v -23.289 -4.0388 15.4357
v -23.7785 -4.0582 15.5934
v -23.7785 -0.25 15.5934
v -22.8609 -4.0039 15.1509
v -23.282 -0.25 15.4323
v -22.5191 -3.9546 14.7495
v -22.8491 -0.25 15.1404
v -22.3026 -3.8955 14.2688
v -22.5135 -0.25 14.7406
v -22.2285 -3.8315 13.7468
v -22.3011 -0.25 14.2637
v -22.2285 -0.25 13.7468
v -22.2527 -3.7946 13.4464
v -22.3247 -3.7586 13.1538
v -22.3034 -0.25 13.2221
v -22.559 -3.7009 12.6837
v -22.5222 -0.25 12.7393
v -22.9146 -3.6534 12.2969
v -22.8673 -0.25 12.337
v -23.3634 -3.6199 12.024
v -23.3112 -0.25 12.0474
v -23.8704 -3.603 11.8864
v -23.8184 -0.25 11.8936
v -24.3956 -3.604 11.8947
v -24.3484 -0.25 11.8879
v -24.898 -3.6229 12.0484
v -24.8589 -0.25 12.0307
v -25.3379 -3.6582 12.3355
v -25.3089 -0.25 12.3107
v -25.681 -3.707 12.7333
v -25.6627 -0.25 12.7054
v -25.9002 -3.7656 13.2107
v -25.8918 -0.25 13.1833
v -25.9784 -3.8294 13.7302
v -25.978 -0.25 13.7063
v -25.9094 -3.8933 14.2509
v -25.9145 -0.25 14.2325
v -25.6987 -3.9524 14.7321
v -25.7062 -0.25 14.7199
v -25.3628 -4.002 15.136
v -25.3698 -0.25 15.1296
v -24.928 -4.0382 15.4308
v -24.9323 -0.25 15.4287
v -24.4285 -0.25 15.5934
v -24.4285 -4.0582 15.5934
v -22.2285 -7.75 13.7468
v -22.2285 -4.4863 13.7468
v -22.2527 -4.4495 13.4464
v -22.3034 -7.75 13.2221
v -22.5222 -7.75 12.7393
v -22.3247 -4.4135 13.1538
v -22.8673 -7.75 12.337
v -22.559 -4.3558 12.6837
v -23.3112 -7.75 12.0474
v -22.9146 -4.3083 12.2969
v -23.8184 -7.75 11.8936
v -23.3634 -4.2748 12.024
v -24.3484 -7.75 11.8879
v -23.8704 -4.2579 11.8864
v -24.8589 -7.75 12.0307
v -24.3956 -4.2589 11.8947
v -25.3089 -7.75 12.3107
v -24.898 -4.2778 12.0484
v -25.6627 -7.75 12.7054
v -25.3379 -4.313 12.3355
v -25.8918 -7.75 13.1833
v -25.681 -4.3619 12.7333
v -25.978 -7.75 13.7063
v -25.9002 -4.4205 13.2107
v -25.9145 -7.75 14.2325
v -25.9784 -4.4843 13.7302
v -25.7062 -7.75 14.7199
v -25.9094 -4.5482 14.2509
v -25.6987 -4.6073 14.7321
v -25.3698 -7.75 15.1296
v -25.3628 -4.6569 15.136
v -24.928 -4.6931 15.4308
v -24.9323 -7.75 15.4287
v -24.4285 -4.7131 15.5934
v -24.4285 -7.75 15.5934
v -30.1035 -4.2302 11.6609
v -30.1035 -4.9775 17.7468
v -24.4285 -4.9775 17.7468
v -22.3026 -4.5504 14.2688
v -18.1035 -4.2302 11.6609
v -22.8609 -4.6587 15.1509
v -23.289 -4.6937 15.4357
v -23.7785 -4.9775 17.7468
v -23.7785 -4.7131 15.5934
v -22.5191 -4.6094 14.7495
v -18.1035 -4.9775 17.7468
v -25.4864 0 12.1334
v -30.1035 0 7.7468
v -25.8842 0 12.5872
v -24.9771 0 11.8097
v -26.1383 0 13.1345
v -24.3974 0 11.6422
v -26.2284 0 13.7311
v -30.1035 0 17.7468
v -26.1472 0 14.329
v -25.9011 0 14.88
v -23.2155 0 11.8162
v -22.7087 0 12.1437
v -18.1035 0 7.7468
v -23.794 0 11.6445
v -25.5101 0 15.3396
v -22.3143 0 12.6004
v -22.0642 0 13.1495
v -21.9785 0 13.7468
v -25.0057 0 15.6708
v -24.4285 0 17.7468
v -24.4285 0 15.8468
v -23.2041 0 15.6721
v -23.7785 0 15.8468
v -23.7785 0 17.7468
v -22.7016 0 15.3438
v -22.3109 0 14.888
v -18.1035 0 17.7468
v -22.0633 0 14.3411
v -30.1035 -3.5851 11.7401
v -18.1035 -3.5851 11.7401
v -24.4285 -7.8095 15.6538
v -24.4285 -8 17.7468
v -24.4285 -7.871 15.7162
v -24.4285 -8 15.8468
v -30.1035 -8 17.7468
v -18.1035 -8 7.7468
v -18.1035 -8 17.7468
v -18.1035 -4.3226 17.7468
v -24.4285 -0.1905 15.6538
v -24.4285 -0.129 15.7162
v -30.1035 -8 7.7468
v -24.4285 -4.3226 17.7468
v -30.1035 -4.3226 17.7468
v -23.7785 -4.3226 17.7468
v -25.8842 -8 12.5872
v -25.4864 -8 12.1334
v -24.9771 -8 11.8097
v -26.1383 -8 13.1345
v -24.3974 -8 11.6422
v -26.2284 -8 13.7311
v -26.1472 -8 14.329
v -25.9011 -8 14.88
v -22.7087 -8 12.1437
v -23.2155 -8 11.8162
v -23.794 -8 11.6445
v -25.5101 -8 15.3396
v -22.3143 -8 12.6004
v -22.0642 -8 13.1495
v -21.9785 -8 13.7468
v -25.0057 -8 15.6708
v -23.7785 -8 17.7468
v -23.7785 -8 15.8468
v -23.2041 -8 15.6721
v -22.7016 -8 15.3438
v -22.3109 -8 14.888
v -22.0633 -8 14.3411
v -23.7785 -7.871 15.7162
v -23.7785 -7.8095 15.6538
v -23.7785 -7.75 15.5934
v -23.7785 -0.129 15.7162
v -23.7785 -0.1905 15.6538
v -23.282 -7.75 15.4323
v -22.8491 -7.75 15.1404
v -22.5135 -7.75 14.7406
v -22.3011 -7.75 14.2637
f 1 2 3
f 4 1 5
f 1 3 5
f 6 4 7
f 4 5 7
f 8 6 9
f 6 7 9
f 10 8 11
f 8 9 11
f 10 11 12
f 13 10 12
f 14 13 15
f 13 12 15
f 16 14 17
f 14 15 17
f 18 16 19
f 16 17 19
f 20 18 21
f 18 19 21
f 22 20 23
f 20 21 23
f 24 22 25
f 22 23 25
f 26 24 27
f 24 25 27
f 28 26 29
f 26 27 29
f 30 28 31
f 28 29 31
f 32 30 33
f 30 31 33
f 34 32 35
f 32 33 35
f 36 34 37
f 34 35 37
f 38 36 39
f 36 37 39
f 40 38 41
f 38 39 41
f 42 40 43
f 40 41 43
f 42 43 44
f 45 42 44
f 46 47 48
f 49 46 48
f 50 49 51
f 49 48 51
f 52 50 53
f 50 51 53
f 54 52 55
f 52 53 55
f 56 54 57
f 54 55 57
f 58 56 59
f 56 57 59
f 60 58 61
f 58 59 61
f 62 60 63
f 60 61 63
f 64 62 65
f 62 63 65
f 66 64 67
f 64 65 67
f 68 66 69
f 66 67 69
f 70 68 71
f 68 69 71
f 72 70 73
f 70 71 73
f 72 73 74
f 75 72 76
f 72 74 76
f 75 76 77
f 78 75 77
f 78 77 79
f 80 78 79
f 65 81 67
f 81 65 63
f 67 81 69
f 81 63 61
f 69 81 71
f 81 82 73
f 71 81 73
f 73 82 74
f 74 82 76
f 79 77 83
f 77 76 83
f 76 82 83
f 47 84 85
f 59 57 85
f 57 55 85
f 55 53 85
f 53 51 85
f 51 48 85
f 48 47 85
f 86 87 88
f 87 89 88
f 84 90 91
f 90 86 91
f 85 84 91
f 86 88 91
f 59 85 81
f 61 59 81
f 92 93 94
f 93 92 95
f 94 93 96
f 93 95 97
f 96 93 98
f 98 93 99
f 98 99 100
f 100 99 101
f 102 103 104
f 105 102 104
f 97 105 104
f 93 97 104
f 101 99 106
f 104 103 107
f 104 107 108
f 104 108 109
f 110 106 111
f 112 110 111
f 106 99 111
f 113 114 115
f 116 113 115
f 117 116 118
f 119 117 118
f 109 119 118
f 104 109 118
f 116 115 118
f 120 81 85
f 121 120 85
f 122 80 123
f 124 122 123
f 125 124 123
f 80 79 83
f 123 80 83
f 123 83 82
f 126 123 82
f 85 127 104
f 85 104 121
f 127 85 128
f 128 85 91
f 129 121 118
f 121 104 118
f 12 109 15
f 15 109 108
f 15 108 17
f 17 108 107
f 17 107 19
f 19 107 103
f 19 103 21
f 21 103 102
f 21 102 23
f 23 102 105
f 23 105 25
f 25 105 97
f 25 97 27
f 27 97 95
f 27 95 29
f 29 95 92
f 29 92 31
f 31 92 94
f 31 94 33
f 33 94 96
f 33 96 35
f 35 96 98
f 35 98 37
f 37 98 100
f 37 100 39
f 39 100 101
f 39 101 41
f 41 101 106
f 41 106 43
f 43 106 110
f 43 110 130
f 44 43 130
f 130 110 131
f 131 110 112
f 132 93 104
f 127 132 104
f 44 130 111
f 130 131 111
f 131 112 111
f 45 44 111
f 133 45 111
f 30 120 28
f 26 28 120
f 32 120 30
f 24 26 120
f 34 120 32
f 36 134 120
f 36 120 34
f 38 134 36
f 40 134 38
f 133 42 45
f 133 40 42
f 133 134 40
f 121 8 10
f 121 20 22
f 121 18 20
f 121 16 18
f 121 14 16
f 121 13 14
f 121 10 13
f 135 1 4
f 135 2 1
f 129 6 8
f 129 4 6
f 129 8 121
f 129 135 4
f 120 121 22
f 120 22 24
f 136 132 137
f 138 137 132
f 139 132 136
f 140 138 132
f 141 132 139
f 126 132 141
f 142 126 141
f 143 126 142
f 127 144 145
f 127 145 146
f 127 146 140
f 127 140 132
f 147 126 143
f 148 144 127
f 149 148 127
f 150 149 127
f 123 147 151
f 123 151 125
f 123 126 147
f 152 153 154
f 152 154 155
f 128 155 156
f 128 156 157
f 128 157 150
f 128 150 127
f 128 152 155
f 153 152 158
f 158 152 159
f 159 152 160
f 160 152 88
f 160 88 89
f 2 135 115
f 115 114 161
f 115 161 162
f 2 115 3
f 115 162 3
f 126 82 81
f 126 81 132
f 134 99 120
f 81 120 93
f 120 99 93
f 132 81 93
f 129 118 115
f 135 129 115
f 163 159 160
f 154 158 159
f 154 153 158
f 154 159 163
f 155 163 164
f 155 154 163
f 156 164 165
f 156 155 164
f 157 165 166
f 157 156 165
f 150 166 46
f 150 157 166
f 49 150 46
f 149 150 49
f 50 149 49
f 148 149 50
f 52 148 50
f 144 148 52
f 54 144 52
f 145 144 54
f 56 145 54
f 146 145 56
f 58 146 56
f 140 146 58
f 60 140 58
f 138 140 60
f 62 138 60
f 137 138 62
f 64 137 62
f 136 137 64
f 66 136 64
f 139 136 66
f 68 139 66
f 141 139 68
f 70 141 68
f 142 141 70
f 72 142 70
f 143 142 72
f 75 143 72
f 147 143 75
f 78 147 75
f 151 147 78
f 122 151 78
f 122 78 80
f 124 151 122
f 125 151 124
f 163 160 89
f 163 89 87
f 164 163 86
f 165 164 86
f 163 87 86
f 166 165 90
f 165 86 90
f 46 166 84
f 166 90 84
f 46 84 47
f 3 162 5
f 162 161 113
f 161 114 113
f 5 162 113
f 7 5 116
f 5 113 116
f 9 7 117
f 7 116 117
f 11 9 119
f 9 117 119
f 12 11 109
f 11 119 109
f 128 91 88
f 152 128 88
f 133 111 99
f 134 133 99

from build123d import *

# Parameters (mm, degrees)
F1_DEPTH = 8
F2_SIZE  = 0.25
F4_W     = 17.8603331085
F4_H     = 0.65
F5_DEPTH = 6.5


with BuildPart() as f1:
    # F0 (on Front) → F1 (new body)
    with BuildSketch(Plane.XZ):
        with BuildLine():
            Line((-24.4284769839, 17.7468117975), (-30.1034769839, 17.7468117975))
            Line((-30.1034769839, 17.7468117975), (-30.1034769839, 7.7468117975))
            Line((-30.1034769839, 7.7468117975), (-18.1034769839, 7.7468117975))
            Line((-18.1034769839, 7.7468117975), (-18.1034769839, 17.7468117975))
            Line((-18.1034769839, 17.7468117975), (-23.7784769839, 17.7468117975))
            Line((-23.7784769839, 17.7468117975), (-23.7784769839, 15.5934303288))
            ThreePointArc((-23.7784769839, 15.5934303288), (-22.6673363223, 14.9522681427), (-22.2284769839, 13.7468117975))
            ThreePointArc((-22.2284769839, 13.7468117975), (-25.308933329, 12.3106711359), (-24.4284769839, 15.5934303288))
            Line((-24.4284769839, 15.5934303288), (-24.4284769839, 17.7468117975))
        make_face()
    extrude(amount=F1_DEPTH)

    # F2
    f2_edges = [f1.edges().sort_by_distance(p)[0] for p in [
        (-24.103477, 0, 11.871812),
        (-24.103477, -8, 11.871812),
    ]]
    chamfer(f2_edges, length=F2_SIZE)

    # F4 (on face) → F5 (cut)
    with BuildSketch(Plane(origin=(0, -2.2654882704, 18.4509213023), x_dir=(1, 0, 0), z_dir=(0, 0.1218693434, -0.9925461516))):
        with Locations((-24.4247596711, 2.4525769118)):
            Rectangle(F4_W, F4_H)
    extrude(amount=F5_DEPTH, mode=Mode.SUBTRACT)


solid = f1.part
